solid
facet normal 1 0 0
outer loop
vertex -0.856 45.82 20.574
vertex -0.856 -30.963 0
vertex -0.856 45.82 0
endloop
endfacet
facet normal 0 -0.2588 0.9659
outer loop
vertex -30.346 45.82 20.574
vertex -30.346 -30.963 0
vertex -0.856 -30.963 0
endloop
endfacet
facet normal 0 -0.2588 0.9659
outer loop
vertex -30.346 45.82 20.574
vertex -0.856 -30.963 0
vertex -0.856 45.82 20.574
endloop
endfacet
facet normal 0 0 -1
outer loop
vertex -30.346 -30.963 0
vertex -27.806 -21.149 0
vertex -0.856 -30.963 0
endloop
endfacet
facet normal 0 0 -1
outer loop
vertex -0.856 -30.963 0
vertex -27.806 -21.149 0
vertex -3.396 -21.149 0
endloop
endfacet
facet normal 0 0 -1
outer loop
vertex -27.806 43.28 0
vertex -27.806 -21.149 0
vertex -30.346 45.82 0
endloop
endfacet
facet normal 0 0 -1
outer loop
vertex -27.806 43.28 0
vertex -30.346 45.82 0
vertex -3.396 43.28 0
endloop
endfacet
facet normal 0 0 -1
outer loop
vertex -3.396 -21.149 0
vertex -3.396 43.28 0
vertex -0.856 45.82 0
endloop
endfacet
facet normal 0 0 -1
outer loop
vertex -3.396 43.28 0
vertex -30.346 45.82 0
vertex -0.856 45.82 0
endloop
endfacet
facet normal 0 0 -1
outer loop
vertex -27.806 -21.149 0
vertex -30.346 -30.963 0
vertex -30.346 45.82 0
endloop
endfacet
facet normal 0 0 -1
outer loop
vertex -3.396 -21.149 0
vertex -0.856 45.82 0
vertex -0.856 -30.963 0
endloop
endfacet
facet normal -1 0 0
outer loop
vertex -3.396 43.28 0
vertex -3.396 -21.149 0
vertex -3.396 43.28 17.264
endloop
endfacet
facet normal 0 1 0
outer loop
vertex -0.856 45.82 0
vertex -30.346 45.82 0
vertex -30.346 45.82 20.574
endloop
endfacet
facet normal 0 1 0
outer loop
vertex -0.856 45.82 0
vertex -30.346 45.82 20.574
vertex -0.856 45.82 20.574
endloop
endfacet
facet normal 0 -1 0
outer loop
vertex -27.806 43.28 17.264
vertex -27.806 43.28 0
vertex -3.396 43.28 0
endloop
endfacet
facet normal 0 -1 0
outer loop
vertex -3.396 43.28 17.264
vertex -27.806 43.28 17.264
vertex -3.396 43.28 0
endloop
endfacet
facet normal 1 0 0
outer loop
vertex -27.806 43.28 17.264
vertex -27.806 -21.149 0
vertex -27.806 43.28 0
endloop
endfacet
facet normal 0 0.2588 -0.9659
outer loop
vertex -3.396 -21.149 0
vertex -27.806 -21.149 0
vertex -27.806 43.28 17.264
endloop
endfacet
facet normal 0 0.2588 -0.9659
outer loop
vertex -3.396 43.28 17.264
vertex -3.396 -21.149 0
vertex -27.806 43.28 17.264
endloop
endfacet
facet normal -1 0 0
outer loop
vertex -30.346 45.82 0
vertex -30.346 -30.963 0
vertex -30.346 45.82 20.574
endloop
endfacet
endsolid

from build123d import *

# Parameters (mm, degrees)
F0_W        = 29.4894
F0_H        = 79.6798
F1_DEPTH    = 20.574
F2_T1_DEPTH = 443.3019107385
F3_T        = -2.54


# Not quite as in the source:
# - a fillet or chamfer that OpenCascade refuses, or shapes differently, is made with other operations: its cross-section is extruded or revolved along the edge and cut away or added


with BuildPart() as f1:
    # F0 (on Top) → F1 (new body)
    with BuildSketch(Plane.XY):
        with Locations((-15.601075187, 5.9804012012)):
            Rectangle(F0_W, F0_H)
    extrude(amount=F1_DEPTH)

    # F2: chamfer of 79.6798 x 21.3501380631 on 1 edges, made by hand

    # F2_s2 → F2_t1 (cut)
    with BuildSketch(Plane.YZ.offset(-237.2520305563)):
        Polygon((-33.8594987988, -0.7761380631), (45.8203012012, 20.574), (-33.8594987988, 20.574), align=None)
    extrude(amount=F2_T1_DEPTH, mode=Mode.SUBTRACT)

    # F3
    f3_openings = [f1.faces().sort_by_distance(p)[0] for p in [
        (-15.601075, 7.428695, 0),
    ]]
    offset(amount=F3_T, openings=f3_openings, kind=Kind.INTERSECTION)


solid = f1.part
